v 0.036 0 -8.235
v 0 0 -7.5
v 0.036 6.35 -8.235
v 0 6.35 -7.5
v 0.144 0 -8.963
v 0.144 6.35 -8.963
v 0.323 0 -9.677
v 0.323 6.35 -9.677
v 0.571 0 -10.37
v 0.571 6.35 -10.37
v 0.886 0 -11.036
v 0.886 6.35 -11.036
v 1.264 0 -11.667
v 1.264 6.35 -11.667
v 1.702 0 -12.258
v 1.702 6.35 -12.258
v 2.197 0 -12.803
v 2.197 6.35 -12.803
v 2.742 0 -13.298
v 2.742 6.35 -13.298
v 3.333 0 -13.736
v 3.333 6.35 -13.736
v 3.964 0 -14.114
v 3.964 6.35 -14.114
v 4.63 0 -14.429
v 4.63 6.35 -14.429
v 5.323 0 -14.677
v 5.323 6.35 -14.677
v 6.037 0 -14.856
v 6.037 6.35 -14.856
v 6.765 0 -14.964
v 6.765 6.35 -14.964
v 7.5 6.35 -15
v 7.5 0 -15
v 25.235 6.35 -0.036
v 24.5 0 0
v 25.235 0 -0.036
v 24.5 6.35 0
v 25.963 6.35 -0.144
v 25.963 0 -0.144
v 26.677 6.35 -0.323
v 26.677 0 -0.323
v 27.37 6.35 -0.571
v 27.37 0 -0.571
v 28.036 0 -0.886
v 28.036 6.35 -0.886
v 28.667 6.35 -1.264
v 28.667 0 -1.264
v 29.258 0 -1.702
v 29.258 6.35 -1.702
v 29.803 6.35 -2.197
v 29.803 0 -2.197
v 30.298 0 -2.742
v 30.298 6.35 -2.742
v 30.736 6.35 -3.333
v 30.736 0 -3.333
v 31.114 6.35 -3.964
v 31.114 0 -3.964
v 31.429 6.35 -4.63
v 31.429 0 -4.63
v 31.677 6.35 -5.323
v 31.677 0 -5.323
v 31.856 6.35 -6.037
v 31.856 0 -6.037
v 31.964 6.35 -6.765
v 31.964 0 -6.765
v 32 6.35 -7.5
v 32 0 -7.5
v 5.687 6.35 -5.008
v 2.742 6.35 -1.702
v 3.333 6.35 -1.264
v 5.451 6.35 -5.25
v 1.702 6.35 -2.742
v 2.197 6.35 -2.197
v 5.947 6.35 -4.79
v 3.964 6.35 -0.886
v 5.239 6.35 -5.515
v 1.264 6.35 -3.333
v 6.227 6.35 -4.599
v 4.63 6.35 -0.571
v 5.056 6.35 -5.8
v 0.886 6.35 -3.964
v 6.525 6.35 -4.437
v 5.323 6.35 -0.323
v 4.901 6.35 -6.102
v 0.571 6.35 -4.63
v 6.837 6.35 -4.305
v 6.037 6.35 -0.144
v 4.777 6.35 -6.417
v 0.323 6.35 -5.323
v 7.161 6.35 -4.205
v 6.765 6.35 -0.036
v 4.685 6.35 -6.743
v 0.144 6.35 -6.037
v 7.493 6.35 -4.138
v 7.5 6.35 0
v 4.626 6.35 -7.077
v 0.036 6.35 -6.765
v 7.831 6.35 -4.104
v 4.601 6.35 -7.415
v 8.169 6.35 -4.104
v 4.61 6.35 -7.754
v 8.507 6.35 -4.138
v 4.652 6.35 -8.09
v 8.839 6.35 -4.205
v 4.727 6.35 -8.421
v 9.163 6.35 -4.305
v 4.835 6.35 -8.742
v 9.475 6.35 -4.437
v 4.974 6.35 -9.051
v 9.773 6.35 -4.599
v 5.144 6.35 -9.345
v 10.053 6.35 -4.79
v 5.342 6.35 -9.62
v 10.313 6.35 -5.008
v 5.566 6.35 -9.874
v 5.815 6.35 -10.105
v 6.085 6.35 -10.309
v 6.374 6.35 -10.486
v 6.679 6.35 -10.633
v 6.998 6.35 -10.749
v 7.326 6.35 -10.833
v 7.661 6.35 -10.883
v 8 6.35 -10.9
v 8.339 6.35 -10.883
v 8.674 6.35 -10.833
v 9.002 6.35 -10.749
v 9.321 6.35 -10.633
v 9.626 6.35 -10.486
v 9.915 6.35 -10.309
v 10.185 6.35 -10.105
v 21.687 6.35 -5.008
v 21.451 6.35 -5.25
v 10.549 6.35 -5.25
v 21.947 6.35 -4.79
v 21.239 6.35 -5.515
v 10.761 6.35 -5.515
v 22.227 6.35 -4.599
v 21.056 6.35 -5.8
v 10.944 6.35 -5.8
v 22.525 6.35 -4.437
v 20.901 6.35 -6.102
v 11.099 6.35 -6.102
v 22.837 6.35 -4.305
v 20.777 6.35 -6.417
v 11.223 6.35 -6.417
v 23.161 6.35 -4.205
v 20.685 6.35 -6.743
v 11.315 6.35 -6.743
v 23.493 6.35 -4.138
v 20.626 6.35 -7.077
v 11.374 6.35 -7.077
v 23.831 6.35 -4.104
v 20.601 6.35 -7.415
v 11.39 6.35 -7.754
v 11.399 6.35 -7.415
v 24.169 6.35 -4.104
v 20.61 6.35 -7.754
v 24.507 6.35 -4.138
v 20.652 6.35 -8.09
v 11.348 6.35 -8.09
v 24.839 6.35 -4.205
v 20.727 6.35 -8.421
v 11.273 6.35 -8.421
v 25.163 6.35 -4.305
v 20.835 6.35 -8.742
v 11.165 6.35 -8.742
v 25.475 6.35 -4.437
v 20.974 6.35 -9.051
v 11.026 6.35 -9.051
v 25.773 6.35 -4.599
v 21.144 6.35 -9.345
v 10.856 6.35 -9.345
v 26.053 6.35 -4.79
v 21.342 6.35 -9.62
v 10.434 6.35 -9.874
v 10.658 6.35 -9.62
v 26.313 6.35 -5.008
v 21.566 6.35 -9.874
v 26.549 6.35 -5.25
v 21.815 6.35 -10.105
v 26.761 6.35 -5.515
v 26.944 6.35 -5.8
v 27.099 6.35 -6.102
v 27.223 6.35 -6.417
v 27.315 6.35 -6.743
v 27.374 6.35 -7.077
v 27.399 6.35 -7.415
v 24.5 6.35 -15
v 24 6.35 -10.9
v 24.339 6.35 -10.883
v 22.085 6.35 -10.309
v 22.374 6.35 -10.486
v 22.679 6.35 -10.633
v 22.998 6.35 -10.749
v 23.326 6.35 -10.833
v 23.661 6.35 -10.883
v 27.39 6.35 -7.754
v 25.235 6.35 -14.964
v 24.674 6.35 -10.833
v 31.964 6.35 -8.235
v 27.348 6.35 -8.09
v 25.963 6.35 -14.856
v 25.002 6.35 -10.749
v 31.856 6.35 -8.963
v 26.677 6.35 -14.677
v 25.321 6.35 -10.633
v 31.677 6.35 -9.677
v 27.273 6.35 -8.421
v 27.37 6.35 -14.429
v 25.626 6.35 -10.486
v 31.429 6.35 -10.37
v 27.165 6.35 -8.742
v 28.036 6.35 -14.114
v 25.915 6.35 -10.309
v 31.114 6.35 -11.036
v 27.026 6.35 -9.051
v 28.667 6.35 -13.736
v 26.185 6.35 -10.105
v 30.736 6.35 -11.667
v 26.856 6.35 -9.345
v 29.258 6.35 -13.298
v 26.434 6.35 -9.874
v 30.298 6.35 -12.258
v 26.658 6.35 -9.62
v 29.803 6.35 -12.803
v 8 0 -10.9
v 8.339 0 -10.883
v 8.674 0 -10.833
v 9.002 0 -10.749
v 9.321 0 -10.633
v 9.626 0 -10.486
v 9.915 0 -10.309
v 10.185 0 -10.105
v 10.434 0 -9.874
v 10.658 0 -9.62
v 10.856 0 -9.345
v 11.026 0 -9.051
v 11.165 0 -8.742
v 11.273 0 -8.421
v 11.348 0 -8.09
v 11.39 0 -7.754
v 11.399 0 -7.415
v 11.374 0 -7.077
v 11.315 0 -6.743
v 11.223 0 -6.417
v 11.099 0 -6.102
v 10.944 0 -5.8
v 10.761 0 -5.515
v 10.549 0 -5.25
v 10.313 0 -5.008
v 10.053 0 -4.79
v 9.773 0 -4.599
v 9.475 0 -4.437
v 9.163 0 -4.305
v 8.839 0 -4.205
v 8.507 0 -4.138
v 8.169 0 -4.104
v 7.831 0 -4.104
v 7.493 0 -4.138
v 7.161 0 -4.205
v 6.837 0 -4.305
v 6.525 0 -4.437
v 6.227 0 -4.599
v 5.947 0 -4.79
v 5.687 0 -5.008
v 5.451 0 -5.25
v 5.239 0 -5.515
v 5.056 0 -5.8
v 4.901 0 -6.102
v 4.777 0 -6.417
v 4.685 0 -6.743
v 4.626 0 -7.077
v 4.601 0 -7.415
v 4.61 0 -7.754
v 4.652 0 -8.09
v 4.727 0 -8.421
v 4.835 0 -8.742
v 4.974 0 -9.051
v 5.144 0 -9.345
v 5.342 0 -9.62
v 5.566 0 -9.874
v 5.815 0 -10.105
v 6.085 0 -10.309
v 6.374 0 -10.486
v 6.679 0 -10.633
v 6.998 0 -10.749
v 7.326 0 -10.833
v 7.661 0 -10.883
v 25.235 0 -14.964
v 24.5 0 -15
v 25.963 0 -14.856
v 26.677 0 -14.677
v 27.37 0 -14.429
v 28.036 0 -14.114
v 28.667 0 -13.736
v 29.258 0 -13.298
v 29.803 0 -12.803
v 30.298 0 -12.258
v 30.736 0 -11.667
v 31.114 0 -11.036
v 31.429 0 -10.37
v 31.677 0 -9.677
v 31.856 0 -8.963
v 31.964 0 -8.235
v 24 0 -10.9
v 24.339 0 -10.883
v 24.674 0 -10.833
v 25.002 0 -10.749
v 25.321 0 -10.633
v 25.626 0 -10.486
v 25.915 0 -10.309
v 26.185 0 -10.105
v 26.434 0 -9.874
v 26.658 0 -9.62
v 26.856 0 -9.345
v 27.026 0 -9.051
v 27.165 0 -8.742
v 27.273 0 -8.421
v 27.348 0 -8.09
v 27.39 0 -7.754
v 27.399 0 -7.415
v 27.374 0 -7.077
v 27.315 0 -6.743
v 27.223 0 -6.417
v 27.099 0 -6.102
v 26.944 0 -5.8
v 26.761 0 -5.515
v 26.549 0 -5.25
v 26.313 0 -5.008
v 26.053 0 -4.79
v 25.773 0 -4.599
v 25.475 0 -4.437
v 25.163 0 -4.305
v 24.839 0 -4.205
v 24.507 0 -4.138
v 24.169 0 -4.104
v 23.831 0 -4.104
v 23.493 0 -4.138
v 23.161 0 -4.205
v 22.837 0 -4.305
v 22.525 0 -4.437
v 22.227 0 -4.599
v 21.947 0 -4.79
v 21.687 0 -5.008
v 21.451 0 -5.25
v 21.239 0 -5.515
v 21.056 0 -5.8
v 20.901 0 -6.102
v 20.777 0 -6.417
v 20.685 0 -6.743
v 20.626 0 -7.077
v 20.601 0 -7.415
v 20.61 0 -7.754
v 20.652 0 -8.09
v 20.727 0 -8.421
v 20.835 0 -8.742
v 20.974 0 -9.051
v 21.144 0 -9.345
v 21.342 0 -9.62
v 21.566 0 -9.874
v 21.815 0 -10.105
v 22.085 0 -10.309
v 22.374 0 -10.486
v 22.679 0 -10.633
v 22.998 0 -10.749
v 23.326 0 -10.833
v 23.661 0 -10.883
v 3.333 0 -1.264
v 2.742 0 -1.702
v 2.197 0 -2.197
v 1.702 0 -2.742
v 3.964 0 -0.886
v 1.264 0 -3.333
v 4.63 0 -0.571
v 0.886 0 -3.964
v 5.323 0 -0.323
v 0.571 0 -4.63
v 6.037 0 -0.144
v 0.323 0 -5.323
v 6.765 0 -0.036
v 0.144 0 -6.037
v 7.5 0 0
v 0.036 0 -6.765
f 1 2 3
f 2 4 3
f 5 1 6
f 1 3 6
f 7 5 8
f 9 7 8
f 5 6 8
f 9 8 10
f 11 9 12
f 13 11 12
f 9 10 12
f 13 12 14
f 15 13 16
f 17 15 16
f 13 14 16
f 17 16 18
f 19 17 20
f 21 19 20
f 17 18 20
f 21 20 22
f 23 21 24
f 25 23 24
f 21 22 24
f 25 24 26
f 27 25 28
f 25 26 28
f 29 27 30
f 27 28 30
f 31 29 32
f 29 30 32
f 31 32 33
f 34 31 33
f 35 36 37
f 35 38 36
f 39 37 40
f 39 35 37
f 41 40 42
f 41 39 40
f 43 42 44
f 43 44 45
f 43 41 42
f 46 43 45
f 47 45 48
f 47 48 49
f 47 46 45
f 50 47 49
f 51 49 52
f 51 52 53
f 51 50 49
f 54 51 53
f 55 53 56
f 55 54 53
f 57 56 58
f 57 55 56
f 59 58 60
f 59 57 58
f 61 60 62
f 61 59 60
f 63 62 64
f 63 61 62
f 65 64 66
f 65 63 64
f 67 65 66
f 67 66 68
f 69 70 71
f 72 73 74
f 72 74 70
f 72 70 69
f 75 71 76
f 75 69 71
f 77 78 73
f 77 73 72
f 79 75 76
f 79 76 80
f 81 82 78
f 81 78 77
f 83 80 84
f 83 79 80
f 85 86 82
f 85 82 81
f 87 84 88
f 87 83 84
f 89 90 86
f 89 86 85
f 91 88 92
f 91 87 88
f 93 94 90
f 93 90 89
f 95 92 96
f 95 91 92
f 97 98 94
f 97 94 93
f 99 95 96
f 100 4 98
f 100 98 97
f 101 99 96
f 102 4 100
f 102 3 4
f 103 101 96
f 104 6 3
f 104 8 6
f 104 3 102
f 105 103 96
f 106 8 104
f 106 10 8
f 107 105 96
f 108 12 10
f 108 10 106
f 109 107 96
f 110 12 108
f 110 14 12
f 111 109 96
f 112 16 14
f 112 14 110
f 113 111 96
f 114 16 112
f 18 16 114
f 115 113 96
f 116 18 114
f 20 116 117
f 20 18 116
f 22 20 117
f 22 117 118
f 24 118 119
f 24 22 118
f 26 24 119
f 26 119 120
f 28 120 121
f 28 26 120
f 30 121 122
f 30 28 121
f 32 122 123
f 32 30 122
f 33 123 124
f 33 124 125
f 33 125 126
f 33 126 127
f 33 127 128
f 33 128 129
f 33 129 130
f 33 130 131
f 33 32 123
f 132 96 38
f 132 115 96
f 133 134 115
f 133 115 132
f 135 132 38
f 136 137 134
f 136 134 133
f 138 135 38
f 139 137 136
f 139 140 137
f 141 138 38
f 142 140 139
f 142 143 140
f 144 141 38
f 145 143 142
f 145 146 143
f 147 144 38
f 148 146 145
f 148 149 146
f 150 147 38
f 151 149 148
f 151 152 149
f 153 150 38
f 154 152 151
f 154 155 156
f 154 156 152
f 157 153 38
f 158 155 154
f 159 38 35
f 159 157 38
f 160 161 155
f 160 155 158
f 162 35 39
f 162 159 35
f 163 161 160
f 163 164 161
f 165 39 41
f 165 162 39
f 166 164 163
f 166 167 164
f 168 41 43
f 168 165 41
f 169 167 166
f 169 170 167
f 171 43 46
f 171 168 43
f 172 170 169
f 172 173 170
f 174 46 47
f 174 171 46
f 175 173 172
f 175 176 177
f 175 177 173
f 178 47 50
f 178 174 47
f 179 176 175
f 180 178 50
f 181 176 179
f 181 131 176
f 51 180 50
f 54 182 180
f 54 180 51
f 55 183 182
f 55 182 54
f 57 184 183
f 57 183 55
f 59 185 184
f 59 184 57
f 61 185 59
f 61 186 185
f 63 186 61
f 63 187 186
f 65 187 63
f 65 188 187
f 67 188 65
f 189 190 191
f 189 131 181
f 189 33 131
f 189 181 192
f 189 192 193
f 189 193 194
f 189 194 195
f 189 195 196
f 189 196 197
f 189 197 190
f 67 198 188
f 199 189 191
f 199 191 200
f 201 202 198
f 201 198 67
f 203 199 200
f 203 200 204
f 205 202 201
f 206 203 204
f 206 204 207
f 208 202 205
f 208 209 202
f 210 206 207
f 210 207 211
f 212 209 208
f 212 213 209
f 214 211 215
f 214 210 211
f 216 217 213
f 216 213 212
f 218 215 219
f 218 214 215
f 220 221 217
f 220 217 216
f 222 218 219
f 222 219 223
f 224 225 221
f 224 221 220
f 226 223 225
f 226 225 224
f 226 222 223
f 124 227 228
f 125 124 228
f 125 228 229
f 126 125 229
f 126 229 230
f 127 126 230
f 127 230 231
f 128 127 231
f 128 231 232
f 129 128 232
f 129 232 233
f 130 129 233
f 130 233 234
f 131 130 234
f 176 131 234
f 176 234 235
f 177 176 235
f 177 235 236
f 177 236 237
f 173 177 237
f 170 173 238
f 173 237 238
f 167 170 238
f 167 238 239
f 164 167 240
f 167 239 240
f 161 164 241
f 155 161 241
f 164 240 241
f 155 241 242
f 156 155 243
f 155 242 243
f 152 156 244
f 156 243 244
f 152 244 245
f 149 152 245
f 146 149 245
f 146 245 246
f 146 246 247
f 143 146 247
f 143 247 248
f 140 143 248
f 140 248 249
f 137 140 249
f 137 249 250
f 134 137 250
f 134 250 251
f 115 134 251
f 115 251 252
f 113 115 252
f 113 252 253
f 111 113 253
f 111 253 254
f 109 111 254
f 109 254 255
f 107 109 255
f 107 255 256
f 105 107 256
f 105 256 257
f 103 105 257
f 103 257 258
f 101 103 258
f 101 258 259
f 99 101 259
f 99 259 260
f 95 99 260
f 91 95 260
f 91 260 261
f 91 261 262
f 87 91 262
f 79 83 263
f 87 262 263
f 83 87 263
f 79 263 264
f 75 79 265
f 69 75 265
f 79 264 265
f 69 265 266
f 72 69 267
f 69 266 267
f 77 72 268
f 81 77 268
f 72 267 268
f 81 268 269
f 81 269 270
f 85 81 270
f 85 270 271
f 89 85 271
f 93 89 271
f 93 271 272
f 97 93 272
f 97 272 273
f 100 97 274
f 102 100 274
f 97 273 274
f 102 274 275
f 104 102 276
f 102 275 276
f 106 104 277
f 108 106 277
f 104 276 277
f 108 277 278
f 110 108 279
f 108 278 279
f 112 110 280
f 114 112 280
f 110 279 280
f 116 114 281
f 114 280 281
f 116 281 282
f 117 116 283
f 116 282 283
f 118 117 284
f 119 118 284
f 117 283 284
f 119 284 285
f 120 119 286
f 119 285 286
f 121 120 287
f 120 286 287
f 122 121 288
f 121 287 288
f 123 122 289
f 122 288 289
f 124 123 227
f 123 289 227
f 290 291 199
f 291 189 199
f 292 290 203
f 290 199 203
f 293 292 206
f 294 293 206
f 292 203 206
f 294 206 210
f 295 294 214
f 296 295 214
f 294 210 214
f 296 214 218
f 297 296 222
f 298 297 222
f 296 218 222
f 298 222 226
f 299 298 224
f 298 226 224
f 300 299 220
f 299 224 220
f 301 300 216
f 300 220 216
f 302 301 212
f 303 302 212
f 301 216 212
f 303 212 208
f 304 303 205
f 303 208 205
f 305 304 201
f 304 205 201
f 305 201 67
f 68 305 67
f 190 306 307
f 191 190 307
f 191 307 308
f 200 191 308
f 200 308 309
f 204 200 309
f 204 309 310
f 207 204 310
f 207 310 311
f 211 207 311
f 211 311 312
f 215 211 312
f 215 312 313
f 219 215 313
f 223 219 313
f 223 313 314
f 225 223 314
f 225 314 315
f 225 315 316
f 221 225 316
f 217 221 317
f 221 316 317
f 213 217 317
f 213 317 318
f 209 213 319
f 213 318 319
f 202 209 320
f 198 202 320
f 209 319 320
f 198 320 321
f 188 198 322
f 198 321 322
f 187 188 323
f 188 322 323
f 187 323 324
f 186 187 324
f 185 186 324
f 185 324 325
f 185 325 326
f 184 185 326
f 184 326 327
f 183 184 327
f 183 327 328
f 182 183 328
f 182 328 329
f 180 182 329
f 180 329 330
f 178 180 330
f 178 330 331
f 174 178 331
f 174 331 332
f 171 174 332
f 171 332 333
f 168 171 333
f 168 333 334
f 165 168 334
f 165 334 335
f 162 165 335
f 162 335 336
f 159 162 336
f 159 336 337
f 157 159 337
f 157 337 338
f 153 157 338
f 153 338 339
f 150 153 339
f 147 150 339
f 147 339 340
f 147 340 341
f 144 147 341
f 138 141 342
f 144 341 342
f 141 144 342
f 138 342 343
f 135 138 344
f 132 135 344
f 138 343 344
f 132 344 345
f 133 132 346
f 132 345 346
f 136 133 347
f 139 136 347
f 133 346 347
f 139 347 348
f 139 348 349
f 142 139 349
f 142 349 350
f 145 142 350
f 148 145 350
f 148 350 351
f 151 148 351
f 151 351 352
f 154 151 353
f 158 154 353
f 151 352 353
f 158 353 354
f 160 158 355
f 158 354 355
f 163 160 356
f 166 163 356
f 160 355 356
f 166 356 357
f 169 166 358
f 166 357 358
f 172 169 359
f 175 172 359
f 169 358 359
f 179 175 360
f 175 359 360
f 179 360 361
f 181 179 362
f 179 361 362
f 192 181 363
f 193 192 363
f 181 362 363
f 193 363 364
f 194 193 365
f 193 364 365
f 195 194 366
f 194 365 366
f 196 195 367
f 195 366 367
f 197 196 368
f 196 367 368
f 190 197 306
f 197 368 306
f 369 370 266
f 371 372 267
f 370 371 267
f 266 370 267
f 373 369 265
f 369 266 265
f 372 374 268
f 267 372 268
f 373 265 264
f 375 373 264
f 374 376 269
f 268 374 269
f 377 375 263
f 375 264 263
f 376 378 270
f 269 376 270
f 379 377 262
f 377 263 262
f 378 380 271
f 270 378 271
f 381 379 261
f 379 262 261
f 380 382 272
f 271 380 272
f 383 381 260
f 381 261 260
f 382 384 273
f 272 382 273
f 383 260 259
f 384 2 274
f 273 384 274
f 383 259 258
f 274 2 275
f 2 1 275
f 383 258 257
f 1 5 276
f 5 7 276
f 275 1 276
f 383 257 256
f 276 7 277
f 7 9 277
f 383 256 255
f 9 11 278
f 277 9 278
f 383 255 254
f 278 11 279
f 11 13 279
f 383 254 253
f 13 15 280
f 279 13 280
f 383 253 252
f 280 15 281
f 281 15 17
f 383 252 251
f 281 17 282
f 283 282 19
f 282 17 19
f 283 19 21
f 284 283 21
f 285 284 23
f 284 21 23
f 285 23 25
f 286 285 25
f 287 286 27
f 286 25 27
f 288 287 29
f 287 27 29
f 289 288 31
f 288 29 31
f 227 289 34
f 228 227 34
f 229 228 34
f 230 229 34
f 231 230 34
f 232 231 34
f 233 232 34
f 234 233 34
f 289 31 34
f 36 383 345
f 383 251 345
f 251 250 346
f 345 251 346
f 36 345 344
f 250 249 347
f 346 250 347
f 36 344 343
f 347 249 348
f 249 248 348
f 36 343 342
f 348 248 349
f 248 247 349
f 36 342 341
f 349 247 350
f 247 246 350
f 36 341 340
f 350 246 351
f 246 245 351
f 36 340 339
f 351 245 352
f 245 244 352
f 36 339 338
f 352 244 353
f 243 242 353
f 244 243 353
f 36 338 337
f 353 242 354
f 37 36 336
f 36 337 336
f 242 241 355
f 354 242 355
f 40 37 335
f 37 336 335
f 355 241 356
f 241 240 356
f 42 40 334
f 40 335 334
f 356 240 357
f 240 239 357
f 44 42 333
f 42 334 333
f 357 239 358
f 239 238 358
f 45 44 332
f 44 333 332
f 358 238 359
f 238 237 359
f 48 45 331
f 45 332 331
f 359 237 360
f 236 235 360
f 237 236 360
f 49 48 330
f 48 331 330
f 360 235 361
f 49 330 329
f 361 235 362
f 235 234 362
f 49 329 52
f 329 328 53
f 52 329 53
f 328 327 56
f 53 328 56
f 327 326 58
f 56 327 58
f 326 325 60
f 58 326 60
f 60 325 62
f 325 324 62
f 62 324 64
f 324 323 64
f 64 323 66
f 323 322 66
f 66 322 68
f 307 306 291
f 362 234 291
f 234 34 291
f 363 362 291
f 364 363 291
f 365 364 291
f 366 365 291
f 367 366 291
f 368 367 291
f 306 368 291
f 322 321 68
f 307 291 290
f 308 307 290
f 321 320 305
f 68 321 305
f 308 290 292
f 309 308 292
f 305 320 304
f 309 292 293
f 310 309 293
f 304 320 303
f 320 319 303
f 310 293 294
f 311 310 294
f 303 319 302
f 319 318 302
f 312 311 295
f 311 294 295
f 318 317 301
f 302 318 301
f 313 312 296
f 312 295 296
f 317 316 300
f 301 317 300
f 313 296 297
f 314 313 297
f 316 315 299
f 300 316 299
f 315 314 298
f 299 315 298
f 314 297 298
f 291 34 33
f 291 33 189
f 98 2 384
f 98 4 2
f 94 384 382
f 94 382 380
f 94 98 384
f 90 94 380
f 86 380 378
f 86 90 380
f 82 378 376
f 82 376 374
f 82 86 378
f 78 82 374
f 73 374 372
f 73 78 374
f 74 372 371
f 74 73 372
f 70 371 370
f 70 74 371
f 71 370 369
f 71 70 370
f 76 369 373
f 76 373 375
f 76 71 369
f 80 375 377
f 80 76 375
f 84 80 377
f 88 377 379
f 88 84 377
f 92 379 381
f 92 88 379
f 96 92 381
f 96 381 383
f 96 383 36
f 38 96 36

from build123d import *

# Parameters (mm, degrees)
SKETCH2_W                    = 32
SKETCH2_H                    = 15
BOSS_EXTRUDE1_DEPTH          = 6.35
TAP_DRILL_FOR_M8X1_25_TAP1_D = 6.8
FILLET1_R                    = 7.5


with BuildPart() as part:
    # Sketch2 → Boss-Extrude1 (new body)
    with BuildSketch(Plane(origin=(0, 0, 0), x_dir=(1, 0, 0), z_dir=(0, 1, 0))):
        with Locations((16, 7.5)):
            Rectangle(SKETCH2_W, SKETCH2_H)
    extrude(amount=BOSS_EXTRUDE1_DEPTH)

    # Tap Drill for M8x1.25 Tap1 (through all)
    with Locations(Plane(origin=(8, 6.35, -7.5), x_dir=(0, 0, 1), z_dir=(0, 1, 0))):
        with Locations((0, 0), (0, 16)):
            Hole(TAP_DRILL_FOR_M8X1_25_TAP1_D / 2)

    # Fillet1
    fillet1_edges = [part.edges().sort_by_distance(p)[0] for p in [
        (32, 3.175, 0),
        (32, 3.175, -15),
        (0, 3.175, -15),
        (0, 3.175, 0),
    ]]
    fillet(fillet1_edges, radius=FILLET1_R - 0.0001)  # a hair under: the kernel refuses the full size


solid = part.part
